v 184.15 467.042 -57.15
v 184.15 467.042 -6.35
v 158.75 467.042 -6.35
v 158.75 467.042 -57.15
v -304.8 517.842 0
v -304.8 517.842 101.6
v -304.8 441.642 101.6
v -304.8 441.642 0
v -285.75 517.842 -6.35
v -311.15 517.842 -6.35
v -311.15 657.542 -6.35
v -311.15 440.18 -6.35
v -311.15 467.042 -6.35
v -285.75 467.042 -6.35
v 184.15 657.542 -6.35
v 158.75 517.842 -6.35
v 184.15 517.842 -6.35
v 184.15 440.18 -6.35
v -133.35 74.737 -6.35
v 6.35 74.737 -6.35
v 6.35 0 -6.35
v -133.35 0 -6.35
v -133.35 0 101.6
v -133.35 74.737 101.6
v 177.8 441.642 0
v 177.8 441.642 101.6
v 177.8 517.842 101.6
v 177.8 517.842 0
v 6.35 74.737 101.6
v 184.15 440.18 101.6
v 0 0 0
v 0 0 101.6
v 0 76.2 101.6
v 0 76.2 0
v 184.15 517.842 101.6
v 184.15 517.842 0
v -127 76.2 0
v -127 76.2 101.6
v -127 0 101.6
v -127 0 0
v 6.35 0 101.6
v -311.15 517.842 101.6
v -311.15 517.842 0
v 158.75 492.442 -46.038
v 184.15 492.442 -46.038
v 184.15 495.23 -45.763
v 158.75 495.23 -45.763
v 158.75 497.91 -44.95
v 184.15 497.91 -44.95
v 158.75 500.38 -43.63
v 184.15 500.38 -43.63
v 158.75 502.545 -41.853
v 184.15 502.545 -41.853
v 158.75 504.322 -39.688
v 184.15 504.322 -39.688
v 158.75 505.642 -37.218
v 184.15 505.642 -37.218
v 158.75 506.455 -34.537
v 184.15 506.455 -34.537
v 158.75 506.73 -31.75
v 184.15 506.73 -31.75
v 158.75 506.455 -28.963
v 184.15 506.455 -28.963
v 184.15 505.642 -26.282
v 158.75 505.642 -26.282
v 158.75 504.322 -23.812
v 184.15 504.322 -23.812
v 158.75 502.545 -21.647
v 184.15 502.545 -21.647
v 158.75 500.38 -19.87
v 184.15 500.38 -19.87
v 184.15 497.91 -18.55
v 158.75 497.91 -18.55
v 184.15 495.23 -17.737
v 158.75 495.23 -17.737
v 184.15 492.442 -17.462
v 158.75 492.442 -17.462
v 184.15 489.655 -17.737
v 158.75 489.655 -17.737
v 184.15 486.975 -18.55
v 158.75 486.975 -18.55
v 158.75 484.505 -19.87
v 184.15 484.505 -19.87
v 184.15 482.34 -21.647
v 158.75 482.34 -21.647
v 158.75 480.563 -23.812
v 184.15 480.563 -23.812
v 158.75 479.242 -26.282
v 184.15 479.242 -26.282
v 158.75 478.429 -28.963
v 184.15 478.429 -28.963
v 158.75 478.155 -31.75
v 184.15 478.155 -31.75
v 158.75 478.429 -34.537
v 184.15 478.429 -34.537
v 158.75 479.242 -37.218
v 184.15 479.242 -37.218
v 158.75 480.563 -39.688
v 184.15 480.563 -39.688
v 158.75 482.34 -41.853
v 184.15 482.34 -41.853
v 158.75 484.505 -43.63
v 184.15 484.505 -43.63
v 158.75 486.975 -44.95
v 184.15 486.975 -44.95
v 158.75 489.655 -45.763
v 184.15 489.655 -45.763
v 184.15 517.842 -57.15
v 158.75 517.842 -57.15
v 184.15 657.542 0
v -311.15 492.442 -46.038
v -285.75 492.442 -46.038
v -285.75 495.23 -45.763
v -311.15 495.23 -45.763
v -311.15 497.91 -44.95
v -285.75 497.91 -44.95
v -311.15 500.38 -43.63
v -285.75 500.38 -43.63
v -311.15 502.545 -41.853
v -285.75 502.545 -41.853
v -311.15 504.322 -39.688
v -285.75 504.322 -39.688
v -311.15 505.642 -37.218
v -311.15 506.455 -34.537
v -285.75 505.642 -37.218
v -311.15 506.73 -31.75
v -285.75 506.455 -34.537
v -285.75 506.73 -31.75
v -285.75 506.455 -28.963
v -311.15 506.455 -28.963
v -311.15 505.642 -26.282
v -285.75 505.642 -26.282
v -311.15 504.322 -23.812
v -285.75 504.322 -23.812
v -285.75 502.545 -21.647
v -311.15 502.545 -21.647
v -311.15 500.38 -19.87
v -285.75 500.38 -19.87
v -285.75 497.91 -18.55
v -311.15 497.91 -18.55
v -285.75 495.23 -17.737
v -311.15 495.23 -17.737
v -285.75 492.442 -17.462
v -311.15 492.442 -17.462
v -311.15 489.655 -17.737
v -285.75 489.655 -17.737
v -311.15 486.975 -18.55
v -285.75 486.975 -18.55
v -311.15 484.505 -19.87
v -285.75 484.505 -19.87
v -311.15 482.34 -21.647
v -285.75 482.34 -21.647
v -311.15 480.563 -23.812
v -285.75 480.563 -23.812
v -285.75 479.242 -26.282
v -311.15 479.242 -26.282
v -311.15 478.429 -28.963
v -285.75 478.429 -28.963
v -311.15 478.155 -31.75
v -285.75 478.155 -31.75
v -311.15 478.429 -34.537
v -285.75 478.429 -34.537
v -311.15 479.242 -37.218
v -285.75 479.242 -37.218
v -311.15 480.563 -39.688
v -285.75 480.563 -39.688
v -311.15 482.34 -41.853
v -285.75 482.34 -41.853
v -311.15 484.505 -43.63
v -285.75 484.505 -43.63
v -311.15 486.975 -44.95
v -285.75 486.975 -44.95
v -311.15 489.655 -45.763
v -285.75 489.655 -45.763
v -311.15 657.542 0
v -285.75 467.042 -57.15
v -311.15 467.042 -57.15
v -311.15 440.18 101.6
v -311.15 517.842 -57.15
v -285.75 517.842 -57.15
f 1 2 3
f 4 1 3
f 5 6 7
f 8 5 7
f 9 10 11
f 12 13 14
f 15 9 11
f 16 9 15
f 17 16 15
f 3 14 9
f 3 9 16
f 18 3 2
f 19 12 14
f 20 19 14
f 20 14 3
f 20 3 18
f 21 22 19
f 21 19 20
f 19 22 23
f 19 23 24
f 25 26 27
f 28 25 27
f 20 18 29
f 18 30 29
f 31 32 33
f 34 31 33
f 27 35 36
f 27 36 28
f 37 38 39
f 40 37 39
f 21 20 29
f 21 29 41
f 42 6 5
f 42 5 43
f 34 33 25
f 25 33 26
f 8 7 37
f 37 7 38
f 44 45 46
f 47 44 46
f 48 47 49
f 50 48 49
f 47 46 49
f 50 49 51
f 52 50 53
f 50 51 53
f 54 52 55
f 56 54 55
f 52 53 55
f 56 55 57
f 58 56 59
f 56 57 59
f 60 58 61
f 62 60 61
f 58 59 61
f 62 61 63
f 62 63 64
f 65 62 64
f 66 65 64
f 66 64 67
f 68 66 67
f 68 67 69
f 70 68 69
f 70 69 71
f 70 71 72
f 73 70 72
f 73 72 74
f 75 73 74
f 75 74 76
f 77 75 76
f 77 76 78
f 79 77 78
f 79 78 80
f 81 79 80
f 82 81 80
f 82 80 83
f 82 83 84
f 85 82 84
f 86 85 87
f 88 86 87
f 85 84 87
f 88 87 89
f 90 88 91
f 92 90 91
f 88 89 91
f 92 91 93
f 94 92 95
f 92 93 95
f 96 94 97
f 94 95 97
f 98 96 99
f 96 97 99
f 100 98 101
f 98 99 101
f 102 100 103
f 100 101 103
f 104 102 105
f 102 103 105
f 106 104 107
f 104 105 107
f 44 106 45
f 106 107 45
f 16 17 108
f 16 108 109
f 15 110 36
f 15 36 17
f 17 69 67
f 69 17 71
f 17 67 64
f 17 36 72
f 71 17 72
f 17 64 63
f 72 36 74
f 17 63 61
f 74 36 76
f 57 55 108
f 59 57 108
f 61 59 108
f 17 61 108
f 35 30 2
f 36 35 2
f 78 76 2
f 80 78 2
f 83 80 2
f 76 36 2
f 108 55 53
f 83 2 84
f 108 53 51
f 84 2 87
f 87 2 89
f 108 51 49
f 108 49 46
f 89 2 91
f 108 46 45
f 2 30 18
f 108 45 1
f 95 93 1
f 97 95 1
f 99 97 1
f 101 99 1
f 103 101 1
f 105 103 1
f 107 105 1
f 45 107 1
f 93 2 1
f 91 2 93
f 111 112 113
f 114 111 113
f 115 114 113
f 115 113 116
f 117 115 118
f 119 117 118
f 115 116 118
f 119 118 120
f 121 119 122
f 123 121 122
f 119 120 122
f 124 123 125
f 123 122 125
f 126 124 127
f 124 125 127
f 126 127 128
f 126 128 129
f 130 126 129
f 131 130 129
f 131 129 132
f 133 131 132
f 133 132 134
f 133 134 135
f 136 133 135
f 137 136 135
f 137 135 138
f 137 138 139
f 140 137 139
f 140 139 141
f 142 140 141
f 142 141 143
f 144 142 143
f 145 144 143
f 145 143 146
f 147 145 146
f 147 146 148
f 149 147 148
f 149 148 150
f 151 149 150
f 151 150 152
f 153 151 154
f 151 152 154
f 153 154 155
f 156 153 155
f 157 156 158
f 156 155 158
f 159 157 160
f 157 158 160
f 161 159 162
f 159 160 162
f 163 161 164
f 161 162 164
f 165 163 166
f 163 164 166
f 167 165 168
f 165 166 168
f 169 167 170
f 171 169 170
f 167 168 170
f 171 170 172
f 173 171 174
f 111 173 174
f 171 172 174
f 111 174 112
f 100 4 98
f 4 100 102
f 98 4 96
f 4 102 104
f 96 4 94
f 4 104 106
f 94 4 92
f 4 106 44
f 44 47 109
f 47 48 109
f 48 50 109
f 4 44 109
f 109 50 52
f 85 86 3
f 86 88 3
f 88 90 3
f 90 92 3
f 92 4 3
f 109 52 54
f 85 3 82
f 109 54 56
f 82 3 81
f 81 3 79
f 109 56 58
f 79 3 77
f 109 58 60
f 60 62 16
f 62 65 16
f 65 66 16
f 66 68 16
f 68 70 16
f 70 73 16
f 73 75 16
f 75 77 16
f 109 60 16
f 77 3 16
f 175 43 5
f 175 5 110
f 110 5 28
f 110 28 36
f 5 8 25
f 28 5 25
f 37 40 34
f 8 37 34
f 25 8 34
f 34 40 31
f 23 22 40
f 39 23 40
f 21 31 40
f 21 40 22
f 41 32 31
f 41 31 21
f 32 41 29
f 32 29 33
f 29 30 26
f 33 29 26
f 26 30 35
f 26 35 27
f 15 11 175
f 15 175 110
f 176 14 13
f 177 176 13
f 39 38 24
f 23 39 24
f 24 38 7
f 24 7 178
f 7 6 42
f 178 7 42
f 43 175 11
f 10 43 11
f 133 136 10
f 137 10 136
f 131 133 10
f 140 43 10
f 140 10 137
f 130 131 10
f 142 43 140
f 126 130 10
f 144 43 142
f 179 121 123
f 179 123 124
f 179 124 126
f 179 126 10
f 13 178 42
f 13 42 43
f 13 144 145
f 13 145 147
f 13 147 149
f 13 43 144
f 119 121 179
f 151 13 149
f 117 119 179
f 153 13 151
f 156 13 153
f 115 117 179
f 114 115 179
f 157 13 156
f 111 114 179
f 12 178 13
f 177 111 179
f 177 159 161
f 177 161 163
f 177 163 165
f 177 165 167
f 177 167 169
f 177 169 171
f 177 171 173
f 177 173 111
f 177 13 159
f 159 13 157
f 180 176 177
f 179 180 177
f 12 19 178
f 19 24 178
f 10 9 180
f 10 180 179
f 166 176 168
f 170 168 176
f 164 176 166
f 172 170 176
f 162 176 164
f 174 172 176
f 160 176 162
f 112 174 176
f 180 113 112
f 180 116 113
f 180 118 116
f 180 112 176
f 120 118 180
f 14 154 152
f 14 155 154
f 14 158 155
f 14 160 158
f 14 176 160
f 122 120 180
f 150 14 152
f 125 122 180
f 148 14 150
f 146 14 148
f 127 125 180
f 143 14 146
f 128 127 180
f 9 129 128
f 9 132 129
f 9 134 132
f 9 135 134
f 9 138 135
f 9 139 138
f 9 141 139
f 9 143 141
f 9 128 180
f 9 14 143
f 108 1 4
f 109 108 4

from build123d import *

# Parameters (mm, degrees)
EXTRUDE_THIN1_DEPTH        = 101.6
EXTRUDE_THIN1_DEPTH_BACK   = 6.35
EXTRUDE_THIN1_2_DEPTH      = 101.6
EXTRUDE_THIN1_2_DEPTH_BACK = 6.35
BOSS_EXTRUDE1_DEPTH        = 6.35
SKETCH2_W                  = 25.4
SKETCH2_H                  = 50.8
BOSS_EXTRUDE2_DEPTH        = 50.8
SKETCH3_R                  = 14.2875
CUT_EXTRUDE1_DEPTH         = 496.3
SKETCH4_W                  = 495.3
SKETCH4_H                  = 6.35
BOSS_EXTRUDE3_DEPTH        = 139.7


with BuildPart() as part:
    # Sketch1 → Extrude-Thin1 (new body, two sides)
    with BuildSketch(Plane.XY) as extrude_thin1_sk:
        Polygon((0, 0), (0, 76.2), (177.8, 441.642362076), (177.8, 517.842362076), (184.15, 517.842362076), (184.15, 440.179589293), (6.35, 74.737227217), (6.35, 0), align=None)
    extrude(amount=EXTRUDE_THIN1_DEPTH)
    extrude(extrude_thin1_sk.sketch, amount=-EXTRUDE_THIN1_DEPTH_BACK)



with BuildPart() as body_2:
    # Sketch1 → Extrude-Thin1 2 (new body, two sides)
    with BuildSketch(Plane.XY) as extrude_thin1_2_sk:
        Polygon((-304.8, 517.842362076), (-304.8, 441.642362076), (-127, 76.2), (-127, 0), (-133.35, 0), (-133.35, 74.737227217), (-311.15, 440.179589293), (-311.15, 517.842362076), align=None)
    extrude(amount=EXTRUDE_THIN1_2_DEPTH)
    extrude(extrude_thin1_2_sk.sketch, amount=-EXTRUDE_THIN1_2_DEPTH_BACK)

    # Sketch1<3> → Boss-Extrude1 (add)
    with BuildSketch(Plane.XY):
        Polygon((-127, 0), (0, 0), (0, 76.2), (177.8, 441.642362076), (177.8, 517.842362076), (-304.8, 517.842362076), (-304.8, 441.642362076), (-127, 76.2), align=None)
    extrude(amount=-BOSS_EXTRUDE1_DEPTH)


with BuildPart() as part_1:
    add(part.part)

    add(body_2.part)  # Boss-Extrude2 merges body 2
    # Sketch2 → Boss-Extrude2 (add)
    with BuildSketch(Plane(origin=(0, 0, -6.35), x_dir=(-1, 0, 0), z_dir=(0, 0, -1))):
        with Locations((-171.45, 492.442362076)):
            Rectangle(SKETCH2_W, SKETCH2_H)
        with Locations((298.45, 492.442362076)):
            Rectangle(SKETCH2_W, SKETCH2_H)
    extrude(amount=BOSS_EXTRUDE2_DEPTH)

    # Sketch3 → Cut-Extrude1 (cut, through all)
    with BuildSketch(Plane(origin=(184.15, 0, 0), x_dir=(0, 0, -1), z_dir=(1, 0, 0))):
        with Locations((31.75, 492.442362076)):
            Circle(SKETCH3_R)
    extrude(amount=-CUT_EXTRUDE1_DEPTH, mode=Mode.SUBTRACT)

    # Sketch4 → Boss-Extrude3 (add)
    with BuildSketch(Plane(origin=(0, 517.842362076, 0), x_dir=(1, 0, 0), z_dir=(0, 1, 0))):
        with Locations((-63.5, 3.175)):
            Rectangle(SKETCH4_W, SKETCH4_H)
    extrude(amount=BOSS_EXTRUDE3_DEPTH)


solid = part_1.part
